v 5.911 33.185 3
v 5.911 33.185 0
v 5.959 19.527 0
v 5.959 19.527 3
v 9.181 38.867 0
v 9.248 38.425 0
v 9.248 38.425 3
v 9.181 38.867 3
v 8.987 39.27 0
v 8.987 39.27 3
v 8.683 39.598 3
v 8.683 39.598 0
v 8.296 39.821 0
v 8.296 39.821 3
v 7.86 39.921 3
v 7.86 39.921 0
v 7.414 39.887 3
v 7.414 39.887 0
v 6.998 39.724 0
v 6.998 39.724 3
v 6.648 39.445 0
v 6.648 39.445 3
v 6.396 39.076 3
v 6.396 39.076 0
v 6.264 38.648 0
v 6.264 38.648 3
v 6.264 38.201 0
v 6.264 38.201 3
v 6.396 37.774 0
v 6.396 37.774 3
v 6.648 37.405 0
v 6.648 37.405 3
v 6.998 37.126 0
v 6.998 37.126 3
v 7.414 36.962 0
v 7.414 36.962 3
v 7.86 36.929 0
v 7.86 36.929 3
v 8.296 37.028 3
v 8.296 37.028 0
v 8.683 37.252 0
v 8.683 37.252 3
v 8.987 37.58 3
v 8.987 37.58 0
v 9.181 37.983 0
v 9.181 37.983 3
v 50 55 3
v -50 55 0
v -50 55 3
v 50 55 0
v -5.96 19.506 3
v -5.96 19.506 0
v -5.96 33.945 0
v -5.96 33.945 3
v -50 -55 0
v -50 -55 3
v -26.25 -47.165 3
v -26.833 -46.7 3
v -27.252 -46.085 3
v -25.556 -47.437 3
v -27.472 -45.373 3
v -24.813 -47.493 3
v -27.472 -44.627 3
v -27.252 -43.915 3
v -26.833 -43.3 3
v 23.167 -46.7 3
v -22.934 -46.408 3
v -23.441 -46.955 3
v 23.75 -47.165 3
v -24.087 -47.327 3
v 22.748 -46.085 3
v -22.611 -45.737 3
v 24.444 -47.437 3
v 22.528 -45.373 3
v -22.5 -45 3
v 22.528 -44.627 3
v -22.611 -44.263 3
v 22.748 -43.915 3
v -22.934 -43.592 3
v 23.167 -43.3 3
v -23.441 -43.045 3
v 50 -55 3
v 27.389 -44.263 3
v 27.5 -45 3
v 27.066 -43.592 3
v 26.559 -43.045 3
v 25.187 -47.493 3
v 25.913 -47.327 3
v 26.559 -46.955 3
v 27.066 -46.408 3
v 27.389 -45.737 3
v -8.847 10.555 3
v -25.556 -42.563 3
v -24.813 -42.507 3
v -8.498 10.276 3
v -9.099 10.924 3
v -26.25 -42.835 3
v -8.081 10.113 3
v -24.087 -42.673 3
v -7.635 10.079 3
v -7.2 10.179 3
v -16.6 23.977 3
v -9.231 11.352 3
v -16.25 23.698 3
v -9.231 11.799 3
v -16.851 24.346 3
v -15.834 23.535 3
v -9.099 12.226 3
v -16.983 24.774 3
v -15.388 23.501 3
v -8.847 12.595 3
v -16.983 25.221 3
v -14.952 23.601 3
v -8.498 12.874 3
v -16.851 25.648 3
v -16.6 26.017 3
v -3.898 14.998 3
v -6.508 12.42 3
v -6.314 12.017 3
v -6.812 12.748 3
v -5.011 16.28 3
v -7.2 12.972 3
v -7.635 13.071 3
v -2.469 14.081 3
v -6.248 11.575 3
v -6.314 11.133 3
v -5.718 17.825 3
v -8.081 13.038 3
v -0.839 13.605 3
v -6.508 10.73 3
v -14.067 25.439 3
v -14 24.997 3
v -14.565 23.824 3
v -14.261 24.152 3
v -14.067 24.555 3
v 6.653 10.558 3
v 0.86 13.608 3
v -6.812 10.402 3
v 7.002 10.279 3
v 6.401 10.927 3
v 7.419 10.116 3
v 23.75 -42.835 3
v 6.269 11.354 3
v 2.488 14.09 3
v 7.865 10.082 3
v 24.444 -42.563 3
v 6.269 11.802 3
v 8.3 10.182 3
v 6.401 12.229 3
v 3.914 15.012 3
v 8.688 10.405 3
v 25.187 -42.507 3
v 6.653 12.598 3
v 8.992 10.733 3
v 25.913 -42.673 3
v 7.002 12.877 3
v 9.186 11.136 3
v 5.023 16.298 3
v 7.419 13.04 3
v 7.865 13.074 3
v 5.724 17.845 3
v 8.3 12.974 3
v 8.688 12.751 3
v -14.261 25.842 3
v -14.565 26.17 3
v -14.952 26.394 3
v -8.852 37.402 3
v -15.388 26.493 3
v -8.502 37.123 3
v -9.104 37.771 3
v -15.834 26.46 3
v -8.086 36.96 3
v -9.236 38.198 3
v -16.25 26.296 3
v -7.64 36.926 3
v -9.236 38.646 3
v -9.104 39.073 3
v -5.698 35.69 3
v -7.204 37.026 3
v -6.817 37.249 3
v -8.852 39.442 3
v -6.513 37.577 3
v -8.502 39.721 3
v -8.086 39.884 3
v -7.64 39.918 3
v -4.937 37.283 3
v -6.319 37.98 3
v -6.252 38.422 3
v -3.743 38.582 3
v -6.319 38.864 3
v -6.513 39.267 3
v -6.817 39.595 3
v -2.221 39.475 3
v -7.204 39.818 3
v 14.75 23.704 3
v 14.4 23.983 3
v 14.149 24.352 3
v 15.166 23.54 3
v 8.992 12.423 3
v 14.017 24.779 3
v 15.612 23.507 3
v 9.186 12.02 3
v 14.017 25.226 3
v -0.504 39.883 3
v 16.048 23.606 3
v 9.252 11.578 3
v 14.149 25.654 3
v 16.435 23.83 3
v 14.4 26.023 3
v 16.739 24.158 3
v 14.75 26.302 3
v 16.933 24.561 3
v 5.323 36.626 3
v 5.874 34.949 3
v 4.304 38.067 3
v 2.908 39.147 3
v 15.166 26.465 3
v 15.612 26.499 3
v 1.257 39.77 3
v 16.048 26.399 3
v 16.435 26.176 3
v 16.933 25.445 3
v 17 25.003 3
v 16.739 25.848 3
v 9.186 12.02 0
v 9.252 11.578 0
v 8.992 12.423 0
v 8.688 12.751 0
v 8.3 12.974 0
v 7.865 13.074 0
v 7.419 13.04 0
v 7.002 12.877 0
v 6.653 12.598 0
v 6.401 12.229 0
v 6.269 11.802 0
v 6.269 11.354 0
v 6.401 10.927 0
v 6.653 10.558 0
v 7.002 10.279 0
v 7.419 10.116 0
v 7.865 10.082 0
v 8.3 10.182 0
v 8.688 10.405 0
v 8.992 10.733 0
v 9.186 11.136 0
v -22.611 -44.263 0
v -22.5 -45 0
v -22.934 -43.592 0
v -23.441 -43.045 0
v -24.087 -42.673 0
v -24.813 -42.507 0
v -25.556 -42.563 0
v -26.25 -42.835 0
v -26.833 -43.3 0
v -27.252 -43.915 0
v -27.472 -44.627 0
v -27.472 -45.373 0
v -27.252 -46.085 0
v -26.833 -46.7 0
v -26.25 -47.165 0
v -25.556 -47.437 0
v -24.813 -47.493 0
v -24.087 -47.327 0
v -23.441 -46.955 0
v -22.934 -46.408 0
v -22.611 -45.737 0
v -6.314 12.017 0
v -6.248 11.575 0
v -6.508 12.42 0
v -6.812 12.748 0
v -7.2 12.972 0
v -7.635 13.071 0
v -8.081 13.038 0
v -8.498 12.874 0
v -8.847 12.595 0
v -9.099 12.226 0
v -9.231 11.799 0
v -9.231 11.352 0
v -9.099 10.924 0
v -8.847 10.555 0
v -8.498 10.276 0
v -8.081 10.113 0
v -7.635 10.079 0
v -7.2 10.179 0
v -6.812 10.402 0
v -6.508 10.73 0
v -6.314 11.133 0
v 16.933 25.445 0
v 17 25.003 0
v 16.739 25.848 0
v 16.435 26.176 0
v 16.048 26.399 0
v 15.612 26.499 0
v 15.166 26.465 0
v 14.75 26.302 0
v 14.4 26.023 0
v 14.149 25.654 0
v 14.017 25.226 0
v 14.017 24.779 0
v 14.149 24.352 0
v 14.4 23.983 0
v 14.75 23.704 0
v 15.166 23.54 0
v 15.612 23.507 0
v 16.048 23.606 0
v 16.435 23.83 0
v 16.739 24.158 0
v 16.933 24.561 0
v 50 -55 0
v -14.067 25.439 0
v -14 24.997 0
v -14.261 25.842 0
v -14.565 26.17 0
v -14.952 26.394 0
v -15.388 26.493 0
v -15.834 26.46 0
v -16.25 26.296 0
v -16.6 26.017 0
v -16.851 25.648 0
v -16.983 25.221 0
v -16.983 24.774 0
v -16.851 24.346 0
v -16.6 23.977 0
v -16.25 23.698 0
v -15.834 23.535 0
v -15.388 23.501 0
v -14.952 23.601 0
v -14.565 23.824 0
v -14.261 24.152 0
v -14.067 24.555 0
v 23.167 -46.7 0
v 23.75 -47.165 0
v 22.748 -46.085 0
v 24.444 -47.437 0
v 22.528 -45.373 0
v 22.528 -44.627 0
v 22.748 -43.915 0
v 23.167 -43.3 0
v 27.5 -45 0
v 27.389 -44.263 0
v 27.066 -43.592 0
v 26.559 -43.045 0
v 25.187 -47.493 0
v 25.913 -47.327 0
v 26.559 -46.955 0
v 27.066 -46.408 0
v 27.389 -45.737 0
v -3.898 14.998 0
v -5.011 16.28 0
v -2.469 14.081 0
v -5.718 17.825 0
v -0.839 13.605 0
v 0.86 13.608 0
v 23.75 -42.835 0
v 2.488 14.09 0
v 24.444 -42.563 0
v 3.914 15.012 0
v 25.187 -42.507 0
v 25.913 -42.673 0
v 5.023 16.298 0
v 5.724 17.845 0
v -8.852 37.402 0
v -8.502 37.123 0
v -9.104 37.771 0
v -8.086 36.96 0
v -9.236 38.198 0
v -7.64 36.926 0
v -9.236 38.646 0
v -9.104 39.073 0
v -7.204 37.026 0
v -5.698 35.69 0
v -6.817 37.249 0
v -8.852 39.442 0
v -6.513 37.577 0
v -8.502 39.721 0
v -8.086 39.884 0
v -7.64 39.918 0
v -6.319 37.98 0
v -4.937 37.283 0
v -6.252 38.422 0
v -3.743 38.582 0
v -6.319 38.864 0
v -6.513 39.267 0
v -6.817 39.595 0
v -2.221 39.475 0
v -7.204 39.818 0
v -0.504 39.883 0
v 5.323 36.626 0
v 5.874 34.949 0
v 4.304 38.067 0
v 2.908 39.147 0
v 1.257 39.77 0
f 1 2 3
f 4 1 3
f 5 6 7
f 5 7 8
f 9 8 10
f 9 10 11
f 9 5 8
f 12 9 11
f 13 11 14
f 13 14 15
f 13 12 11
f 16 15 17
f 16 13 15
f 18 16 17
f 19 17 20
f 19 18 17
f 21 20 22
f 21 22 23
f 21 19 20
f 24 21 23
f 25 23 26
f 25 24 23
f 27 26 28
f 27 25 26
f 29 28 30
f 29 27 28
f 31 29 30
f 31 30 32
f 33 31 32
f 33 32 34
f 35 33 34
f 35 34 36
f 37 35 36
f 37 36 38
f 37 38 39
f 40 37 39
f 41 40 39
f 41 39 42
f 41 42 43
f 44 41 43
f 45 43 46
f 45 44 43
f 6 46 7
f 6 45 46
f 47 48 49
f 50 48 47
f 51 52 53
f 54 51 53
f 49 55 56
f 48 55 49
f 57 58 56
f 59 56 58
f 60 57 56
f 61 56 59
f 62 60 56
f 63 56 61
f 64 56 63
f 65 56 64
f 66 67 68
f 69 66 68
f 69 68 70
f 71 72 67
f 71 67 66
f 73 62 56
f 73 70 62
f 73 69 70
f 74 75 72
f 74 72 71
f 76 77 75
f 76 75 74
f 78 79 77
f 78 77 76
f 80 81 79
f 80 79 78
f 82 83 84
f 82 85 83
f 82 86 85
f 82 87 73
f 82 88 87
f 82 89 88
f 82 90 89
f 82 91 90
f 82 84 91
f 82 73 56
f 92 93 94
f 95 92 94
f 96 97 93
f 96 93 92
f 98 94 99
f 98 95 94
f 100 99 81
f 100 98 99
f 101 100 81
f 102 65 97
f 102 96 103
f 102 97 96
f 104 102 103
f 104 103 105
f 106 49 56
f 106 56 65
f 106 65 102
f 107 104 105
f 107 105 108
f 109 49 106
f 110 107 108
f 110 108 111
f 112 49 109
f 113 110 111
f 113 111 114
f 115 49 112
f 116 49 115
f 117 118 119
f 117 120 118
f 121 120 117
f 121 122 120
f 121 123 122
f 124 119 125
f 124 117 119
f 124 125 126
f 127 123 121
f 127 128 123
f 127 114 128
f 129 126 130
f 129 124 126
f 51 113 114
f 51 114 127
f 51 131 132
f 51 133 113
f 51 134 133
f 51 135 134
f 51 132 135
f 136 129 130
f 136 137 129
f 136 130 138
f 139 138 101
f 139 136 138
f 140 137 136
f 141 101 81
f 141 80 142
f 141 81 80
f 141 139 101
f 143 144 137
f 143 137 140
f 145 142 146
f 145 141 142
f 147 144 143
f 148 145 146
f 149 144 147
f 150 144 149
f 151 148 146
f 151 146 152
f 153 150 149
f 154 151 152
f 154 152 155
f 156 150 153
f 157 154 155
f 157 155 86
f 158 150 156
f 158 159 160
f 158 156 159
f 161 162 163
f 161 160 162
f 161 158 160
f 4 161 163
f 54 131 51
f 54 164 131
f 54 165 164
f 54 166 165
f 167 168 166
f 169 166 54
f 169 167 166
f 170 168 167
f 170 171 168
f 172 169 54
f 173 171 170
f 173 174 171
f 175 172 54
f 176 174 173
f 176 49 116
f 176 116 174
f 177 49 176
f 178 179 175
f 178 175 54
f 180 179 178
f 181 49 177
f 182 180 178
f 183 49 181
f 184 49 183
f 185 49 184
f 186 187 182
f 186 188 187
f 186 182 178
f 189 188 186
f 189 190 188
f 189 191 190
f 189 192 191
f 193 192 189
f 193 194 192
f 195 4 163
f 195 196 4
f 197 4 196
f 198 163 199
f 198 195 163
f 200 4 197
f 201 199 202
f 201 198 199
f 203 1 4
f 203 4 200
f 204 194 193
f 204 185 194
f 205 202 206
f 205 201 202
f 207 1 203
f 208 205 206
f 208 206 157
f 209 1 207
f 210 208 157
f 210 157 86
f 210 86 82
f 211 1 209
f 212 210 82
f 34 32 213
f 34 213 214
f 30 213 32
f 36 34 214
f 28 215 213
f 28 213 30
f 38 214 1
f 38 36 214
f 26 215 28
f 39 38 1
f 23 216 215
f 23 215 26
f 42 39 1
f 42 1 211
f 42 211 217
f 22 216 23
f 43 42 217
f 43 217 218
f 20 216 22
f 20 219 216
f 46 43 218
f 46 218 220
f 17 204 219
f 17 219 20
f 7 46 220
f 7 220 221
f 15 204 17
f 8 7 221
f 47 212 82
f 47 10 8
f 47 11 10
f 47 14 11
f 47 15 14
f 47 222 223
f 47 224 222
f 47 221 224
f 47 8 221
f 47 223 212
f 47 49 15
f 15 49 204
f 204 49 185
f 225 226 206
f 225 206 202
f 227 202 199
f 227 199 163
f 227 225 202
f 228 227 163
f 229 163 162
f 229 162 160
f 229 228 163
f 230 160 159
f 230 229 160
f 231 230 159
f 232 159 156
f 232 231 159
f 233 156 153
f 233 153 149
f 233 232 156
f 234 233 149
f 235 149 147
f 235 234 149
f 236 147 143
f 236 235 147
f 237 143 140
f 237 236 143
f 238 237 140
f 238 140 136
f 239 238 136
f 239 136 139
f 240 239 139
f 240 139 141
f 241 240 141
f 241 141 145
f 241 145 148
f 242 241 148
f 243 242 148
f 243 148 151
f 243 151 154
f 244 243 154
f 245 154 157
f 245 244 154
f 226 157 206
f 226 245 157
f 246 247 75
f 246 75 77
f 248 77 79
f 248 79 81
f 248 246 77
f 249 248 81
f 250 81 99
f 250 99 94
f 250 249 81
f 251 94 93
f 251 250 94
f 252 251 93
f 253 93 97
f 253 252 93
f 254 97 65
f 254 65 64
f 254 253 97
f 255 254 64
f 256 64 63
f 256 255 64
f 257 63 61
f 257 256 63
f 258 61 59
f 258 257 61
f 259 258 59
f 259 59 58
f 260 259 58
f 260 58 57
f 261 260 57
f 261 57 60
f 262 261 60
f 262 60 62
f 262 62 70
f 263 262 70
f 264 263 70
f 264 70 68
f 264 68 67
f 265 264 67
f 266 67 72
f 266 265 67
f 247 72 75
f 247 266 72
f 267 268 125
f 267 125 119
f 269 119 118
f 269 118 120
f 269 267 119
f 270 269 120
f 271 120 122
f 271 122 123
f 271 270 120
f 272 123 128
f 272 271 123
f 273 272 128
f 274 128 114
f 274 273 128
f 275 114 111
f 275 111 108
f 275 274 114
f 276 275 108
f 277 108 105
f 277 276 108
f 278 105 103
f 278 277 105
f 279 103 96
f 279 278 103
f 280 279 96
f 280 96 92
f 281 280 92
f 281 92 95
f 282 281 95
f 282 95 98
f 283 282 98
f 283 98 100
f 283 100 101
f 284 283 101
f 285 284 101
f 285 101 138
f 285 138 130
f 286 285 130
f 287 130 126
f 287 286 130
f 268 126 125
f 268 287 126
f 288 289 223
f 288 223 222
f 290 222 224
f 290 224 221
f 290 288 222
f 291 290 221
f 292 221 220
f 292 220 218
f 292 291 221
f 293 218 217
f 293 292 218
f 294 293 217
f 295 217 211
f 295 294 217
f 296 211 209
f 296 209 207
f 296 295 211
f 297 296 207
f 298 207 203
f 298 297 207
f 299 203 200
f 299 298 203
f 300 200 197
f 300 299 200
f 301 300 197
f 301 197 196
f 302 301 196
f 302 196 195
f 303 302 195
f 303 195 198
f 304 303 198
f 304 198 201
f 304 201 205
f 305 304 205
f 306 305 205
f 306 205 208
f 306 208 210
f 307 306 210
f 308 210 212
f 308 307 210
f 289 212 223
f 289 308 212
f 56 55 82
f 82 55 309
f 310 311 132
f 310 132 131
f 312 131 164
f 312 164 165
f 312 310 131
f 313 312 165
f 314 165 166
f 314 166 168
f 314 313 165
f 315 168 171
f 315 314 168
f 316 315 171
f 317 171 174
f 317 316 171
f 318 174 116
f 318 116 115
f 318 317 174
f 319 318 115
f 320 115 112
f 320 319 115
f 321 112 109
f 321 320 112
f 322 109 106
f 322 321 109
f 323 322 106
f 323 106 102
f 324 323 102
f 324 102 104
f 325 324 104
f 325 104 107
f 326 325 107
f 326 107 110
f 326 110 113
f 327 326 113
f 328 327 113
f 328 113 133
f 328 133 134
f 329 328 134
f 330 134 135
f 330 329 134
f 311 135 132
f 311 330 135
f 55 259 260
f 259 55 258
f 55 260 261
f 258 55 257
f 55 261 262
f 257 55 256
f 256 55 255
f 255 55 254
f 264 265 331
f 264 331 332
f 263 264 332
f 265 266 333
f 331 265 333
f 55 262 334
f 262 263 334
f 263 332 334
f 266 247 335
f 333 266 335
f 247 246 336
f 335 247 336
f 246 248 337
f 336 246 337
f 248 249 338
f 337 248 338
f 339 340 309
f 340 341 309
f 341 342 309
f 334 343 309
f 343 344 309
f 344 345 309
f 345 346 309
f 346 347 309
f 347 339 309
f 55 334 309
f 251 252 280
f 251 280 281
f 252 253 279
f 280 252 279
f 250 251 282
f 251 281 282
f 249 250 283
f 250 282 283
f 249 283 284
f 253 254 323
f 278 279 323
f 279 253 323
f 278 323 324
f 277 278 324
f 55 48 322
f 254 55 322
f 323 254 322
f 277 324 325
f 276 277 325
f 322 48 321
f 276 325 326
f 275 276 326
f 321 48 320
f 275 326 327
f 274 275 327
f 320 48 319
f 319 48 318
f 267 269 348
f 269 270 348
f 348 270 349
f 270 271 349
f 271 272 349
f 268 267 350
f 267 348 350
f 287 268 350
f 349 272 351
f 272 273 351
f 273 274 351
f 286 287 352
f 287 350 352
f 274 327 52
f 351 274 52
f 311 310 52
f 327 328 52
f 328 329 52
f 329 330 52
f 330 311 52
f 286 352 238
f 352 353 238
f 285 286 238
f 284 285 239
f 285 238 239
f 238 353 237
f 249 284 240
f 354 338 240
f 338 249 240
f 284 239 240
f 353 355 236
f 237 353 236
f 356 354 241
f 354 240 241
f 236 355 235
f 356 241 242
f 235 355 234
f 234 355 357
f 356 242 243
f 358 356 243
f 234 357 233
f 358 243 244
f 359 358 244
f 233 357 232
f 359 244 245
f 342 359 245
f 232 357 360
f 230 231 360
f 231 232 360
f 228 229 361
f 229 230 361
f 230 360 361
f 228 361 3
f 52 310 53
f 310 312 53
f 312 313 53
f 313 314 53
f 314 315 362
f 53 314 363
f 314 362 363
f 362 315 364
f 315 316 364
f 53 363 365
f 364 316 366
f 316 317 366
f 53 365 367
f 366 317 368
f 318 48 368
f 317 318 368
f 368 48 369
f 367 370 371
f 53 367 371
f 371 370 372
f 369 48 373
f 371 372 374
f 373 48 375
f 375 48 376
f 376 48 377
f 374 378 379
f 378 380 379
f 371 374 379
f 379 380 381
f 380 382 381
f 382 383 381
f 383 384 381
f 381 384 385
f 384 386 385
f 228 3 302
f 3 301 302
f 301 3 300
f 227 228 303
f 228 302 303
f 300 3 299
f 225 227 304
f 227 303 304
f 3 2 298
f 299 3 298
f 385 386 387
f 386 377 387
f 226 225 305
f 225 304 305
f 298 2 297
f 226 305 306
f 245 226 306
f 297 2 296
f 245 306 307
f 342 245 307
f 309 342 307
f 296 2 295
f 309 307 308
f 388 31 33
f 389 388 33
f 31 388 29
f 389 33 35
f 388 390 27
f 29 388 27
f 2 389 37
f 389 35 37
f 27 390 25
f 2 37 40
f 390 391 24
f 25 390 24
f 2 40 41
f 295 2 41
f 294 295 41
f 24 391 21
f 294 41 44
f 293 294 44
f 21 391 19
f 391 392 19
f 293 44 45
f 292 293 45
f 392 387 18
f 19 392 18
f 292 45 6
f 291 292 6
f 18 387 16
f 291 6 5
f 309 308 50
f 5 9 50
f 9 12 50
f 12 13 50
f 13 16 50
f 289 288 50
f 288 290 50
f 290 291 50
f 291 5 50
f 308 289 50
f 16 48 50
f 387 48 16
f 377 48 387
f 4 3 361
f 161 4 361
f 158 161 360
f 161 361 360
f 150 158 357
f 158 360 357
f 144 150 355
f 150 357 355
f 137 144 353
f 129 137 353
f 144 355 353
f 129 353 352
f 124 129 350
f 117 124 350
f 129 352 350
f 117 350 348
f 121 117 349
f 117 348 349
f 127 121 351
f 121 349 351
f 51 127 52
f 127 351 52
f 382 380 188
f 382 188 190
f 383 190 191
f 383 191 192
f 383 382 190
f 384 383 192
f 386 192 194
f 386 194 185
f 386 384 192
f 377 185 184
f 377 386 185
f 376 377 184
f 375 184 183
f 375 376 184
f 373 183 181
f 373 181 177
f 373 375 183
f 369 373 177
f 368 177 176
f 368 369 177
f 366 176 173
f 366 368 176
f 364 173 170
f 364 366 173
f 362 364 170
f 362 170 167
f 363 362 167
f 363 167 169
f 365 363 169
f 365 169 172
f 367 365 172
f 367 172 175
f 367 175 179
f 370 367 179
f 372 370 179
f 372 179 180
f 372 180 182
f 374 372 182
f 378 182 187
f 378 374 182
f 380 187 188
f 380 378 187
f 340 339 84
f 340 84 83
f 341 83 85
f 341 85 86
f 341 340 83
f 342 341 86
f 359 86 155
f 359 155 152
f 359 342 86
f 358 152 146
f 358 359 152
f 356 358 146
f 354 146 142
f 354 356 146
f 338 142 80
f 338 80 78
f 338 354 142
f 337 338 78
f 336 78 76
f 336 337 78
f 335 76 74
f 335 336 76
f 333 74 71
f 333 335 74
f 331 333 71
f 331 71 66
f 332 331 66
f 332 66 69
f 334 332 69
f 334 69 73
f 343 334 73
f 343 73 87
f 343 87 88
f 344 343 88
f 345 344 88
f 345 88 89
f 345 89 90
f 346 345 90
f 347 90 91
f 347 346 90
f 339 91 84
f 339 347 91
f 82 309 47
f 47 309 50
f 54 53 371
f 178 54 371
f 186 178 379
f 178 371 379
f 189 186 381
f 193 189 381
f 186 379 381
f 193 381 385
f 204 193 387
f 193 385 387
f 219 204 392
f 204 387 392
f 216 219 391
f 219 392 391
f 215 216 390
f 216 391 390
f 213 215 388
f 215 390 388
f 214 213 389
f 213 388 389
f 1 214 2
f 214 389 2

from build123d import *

# Parameters (mm, degrees)
SKETCH1_W           = 100
SKETCH1_H           = 110
SKETCH1_R           = 2.5
SKETCH1_R_2         = 1.5
BOSS_EXTRUDE1_DEPTH = 3


with BuildPart() as part:
    # Sketch1 → Boss-Extrude1 (new body)
    with BuildSketch(Plane.XY):
        Rectangle(SKETCH1_W, SKETCH1_H)
        with Locations((-25, -45)):
            Circle(SKETCH1_R, mode=Mode.SUBTRACT)
        with Locations((25, -45)):
            Circle(SKETCH1_R, mode=Mode.SUBTRACT)
        with Locations((-15.5, 24.997203367)):
            Circle(SKETCH1_R_2, mode=Mode.SUBTRACT)
        with Locations((-7.752421955, 38.421995442)):
            Circle(SKETCH1_R_2, mode=Mode.SUBTRACT)
        with Locations((7.747578045, 38.424792075)):
            Circle(SKETCH1_R_2, mode=Mode.SUBTRACT)
        with Locations((15.5, 25.002796633)):
            Circle(SKETCH1_R_2, mode=Mode.SUBTRACT)
        with Locations((7.752421955, 11.578004558)):
            Circle(SKETCH1_R_2, mode=Mode.SUBTRACT)
        with Locations((-7.747578045, 11.575207925)):
            Circle(SKETCH1_R_2, mode=Mode.SUBTRACT)
        with BuildLine():
            Line((5.910876507, 33.185052569), (5.959490464, 19.526769566))
            ThreePointArc((5.959490464, 19.526769566), (0.010605831, 13.546039163), (-5.959528213, 19.505557938))
            Line((-5.959528213, 19.505557938), (-5.959528213, 33.944996934))
            ThreePointArc((-5.959528213, 33.944996934), (0.380750058, 39.892349783), (5.910876507, 33.185052569))
        make_face(mode=Mode.SUBTRACT)
    extrude(amount=BOSS_EXTRUDE1_DEPTH)


solid = part.part
